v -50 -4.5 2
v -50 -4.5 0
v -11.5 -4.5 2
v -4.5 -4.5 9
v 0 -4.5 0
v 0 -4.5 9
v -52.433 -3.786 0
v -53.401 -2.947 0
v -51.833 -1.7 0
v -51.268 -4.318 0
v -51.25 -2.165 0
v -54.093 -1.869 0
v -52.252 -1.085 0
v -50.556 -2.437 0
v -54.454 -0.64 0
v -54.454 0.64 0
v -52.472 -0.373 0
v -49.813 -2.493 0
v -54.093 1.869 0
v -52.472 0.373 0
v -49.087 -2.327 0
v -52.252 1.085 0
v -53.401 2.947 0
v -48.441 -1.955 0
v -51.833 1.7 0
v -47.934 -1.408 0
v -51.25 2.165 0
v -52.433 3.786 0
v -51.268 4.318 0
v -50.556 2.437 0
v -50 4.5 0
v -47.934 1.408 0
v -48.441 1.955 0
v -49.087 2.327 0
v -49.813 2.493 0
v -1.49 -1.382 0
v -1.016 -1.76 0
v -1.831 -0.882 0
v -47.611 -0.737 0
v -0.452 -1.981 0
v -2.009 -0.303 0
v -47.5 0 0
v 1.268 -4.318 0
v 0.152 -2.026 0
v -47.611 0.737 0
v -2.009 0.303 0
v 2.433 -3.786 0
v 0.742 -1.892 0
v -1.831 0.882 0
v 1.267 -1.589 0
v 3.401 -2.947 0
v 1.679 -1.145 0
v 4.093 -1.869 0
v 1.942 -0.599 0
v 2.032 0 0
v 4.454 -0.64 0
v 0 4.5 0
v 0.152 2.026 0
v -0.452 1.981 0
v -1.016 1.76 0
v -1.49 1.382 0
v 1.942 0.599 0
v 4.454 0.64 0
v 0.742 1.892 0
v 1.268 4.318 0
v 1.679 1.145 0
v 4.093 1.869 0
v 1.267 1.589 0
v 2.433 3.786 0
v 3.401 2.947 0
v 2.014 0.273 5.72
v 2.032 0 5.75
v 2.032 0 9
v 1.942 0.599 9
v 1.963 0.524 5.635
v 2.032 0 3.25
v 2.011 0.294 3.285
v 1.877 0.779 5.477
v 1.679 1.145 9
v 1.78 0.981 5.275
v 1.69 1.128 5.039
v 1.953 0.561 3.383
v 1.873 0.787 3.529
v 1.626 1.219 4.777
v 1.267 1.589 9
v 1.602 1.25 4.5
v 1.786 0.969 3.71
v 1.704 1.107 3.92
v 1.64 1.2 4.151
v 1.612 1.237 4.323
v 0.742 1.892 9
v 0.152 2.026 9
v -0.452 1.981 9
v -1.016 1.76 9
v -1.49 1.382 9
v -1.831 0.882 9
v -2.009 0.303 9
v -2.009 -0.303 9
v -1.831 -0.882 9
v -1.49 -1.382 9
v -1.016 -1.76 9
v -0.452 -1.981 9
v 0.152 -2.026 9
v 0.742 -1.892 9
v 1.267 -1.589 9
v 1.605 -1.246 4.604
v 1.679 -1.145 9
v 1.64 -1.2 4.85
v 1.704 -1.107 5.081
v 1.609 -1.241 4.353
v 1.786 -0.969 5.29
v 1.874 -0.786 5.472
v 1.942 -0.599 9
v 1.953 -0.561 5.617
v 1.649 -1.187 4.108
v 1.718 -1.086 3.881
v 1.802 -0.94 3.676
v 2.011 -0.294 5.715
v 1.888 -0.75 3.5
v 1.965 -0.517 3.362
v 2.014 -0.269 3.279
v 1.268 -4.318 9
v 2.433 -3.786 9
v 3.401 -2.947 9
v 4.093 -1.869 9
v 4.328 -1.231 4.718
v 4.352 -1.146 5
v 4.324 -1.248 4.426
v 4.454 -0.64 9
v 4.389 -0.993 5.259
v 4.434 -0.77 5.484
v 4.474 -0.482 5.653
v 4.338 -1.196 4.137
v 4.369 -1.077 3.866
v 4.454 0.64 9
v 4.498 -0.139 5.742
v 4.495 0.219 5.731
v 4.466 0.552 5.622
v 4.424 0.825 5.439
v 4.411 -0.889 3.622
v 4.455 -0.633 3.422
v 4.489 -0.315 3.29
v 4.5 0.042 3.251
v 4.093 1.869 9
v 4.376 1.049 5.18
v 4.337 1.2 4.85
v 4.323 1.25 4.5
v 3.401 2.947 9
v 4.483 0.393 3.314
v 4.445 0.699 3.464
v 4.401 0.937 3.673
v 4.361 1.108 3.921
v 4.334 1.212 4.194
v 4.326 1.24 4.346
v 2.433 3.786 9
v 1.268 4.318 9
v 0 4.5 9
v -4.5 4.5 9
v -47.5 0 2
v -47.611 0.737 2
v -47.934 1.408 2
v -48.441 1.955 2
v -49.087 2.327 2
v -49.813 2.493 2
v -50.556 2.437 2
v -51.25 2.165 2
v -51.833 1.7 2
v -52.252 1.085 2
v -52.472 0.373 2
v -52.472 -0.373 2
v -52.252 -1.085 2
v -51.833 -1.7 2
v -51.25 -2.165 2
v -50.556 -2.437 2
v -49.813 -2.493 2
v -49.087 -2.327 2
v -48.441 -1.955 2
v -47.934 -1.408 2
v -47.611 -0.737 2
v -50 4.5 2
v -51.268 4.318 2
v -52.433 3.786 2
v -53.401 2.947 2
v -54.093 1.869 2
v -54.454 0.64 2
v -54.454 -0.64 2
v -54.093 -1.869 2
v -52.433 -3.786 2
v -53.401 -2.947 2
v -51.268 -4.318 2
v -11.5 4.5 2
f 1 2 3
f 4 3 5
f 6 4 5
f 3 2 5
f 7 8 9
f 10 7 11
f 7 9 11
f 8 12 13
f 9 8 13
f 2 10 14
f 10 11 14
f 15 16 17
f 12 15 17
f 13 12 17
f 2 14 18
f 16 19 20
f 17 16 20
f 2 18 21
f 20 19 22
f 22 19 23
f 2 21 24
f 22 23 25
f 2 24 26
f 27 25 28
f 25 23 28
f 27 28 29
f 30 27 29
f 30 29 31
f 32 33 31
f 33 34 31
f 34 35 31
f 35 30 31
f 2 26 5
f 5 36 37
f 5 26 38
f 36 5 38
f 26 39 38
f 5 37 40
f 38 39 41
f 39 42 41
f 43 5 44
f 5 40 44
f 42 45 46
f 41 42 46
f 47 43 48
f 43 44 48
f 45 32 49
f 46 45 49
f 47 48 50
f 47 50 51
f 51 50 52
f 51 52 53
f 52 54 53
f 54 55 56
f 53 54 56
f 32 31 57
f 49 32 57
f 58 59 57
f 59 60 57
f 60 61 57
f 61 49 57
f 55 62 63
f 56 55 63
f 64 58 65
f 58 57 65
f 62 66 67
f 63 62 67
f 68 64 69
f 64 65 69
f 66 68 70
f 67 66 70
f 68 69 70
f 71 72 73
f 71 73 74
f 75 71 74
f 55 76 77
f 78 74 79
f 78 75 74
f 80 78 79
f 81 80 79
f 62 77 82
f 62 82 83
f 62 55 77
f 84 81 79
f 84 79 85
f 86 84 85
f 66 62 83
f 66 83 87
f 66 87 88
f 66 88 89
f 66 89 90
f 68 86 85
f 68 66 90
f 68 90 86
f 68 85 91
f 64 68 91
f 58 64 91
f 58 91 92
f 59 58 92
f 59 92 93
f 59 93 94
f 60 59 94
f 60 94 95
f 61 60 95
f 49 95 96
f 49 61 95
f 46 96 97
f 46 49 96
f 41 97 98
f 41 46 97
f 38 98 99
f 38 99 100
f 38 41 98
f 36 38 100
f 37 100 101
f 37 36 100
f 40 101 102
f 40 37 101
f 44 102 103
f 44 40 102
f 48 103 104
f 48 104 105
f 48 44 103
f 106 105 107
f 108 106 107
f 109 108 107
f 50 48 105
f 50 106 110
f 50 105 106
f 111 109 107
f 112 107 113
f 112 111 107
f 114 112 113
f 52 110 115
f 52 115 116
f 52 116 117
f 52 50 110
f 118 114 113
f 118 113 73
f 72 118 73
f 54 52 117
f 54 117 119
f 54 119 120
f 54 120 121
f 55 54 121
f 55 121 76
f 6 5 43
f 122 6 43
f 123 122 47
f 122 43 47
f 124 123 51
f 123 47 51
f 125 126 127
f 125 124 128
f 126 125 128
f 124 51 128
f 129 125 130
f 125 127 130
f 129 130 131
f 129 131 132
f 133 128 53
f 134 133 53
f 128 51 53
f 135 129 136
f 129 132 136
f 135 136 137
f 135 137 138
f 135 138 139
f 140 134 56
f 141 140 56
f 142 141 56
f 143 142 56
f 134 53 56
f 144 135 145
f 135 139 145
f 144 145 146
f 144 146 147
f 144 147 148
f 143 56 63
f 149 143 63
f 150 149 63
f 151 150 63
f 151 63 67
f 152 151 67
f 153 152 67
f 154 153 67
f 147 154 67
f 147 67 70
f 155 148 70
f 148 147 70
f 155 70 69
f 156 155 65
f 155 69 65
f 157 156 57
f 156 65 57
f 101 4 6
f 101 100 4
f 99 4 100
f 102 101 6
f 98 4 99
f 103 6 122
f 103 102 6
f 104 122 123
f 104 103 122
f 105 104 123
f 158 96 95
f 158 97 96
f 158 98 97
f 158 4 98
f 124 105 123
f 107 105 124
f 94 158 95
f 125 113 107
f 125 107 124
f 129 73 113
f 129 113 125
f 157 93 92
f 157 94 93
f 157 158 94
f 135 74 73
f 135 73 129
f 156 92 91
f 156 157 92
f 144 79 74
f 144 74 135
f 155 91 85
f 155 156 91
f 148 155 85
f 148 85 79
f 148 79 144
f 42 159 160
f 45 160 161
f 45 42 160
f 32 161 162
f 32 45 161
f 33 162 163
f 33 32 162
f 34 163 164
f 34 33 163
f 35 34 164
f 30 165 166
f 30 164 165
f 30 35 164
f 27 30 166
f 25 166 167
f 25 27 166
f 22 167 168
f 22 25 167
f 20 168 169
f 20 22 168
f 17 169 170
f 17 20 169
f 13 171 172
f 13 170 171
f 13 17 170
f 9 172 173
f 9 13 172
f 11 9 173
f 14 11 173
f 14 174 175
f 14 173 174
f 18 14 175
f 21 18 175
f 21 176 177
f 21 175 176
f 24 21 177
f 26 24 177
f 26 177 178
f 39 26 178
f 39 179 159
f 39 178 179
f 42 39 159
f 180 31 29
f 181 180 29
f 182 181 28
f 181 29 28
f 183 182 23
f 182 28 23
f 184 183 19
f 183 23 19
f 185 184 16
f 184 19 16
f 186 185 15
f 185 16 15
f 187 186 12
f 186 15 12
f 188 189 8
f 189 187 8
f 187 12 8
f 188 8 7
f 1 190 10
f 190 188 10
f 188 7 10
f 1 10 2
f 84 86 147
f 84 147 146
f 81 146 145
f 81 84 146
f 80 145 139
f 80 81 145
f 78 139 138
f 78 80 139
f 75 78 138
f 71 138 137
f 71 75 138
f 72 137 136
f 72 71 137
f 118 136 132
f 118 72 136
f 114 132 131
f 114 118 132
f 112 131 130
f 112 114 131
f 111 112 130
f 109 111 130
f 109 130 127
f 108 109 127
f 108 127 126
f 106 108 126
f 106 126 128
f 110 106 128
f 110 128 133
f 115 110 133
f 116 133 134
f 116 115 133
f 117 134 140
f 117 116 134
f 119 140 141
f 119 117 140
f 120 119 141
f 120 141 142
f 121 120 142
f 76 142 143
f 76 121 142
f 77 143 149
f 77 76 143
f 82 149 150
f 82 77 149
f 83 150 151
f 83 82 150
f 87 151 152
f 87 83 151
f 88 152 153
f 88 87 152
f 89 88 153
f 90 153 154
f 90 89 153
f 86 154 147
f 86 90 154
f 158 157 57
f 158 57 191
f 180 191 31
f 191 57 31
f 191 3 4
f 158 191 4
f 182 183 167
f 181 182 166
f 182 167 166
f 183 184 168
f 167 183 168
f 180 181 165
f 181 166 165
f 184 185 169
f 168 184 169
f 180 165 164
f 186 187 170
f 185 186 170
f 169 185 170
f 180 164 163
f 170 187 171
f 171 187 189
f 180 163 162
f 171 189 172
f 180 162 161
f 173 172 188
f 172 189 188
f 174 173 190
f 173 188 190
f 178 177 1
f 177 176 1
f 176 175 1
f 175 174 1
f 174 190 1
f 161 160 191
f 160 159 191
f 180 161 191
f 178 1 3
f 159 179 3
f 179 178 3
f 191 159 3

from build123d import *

# Parameters (mm, degrees)
F0_R     = 2.5
F0_R_2   = 2.032
F1_DEPTH = 9
F3_DEPTH = 9.001
F4_R     = 1.25
F5_DEPTH = 4.501


with BuildPart() as f1:
    # F0 (on Top) → F1 (new body)
    with BuildSketch(Plane.XY):
        with BuildLine():
            Line((0, 4.5), (-50, 4.5))
            ThreePointArc((-50, 4.5), (-54.5, 0), (-50, -4.5))
            Line((-50, -4.5), (0, -4.5))
            ThreePointArc((0, -4.5), (4.5, 0), (0, 4.5))
        make_face()
        with Locations((-50, 0)):
            Circle(F0_R, mode=Mode.SUBTRACT)
        Circle(F0_R_2, mode=Mode.SUBTRACT)
    extrude(amount=F1_DEPTH)

    # F2 (on face) → F3 (cut, through all)
    with BuildSketch(Plane.XZ.offset(4.5)):
        Polygon((-98.52826, 9), (-94.756936, 2), (-11.5, 2), (-4.5, 9), align=None)
    extrude(amount=-F3_DEPTH, mode=Mode.SUBTRACT)

    # F4 (on Right) → F5 (cut, through all)
    with BuildSketch(Plane.YZ):
        with Locations((0, 4.5)):
            Circle(F4_R)
    extrude(amount=F5_DEPTH, mode=Mode.SUBTRACT)


solid = f1.part
